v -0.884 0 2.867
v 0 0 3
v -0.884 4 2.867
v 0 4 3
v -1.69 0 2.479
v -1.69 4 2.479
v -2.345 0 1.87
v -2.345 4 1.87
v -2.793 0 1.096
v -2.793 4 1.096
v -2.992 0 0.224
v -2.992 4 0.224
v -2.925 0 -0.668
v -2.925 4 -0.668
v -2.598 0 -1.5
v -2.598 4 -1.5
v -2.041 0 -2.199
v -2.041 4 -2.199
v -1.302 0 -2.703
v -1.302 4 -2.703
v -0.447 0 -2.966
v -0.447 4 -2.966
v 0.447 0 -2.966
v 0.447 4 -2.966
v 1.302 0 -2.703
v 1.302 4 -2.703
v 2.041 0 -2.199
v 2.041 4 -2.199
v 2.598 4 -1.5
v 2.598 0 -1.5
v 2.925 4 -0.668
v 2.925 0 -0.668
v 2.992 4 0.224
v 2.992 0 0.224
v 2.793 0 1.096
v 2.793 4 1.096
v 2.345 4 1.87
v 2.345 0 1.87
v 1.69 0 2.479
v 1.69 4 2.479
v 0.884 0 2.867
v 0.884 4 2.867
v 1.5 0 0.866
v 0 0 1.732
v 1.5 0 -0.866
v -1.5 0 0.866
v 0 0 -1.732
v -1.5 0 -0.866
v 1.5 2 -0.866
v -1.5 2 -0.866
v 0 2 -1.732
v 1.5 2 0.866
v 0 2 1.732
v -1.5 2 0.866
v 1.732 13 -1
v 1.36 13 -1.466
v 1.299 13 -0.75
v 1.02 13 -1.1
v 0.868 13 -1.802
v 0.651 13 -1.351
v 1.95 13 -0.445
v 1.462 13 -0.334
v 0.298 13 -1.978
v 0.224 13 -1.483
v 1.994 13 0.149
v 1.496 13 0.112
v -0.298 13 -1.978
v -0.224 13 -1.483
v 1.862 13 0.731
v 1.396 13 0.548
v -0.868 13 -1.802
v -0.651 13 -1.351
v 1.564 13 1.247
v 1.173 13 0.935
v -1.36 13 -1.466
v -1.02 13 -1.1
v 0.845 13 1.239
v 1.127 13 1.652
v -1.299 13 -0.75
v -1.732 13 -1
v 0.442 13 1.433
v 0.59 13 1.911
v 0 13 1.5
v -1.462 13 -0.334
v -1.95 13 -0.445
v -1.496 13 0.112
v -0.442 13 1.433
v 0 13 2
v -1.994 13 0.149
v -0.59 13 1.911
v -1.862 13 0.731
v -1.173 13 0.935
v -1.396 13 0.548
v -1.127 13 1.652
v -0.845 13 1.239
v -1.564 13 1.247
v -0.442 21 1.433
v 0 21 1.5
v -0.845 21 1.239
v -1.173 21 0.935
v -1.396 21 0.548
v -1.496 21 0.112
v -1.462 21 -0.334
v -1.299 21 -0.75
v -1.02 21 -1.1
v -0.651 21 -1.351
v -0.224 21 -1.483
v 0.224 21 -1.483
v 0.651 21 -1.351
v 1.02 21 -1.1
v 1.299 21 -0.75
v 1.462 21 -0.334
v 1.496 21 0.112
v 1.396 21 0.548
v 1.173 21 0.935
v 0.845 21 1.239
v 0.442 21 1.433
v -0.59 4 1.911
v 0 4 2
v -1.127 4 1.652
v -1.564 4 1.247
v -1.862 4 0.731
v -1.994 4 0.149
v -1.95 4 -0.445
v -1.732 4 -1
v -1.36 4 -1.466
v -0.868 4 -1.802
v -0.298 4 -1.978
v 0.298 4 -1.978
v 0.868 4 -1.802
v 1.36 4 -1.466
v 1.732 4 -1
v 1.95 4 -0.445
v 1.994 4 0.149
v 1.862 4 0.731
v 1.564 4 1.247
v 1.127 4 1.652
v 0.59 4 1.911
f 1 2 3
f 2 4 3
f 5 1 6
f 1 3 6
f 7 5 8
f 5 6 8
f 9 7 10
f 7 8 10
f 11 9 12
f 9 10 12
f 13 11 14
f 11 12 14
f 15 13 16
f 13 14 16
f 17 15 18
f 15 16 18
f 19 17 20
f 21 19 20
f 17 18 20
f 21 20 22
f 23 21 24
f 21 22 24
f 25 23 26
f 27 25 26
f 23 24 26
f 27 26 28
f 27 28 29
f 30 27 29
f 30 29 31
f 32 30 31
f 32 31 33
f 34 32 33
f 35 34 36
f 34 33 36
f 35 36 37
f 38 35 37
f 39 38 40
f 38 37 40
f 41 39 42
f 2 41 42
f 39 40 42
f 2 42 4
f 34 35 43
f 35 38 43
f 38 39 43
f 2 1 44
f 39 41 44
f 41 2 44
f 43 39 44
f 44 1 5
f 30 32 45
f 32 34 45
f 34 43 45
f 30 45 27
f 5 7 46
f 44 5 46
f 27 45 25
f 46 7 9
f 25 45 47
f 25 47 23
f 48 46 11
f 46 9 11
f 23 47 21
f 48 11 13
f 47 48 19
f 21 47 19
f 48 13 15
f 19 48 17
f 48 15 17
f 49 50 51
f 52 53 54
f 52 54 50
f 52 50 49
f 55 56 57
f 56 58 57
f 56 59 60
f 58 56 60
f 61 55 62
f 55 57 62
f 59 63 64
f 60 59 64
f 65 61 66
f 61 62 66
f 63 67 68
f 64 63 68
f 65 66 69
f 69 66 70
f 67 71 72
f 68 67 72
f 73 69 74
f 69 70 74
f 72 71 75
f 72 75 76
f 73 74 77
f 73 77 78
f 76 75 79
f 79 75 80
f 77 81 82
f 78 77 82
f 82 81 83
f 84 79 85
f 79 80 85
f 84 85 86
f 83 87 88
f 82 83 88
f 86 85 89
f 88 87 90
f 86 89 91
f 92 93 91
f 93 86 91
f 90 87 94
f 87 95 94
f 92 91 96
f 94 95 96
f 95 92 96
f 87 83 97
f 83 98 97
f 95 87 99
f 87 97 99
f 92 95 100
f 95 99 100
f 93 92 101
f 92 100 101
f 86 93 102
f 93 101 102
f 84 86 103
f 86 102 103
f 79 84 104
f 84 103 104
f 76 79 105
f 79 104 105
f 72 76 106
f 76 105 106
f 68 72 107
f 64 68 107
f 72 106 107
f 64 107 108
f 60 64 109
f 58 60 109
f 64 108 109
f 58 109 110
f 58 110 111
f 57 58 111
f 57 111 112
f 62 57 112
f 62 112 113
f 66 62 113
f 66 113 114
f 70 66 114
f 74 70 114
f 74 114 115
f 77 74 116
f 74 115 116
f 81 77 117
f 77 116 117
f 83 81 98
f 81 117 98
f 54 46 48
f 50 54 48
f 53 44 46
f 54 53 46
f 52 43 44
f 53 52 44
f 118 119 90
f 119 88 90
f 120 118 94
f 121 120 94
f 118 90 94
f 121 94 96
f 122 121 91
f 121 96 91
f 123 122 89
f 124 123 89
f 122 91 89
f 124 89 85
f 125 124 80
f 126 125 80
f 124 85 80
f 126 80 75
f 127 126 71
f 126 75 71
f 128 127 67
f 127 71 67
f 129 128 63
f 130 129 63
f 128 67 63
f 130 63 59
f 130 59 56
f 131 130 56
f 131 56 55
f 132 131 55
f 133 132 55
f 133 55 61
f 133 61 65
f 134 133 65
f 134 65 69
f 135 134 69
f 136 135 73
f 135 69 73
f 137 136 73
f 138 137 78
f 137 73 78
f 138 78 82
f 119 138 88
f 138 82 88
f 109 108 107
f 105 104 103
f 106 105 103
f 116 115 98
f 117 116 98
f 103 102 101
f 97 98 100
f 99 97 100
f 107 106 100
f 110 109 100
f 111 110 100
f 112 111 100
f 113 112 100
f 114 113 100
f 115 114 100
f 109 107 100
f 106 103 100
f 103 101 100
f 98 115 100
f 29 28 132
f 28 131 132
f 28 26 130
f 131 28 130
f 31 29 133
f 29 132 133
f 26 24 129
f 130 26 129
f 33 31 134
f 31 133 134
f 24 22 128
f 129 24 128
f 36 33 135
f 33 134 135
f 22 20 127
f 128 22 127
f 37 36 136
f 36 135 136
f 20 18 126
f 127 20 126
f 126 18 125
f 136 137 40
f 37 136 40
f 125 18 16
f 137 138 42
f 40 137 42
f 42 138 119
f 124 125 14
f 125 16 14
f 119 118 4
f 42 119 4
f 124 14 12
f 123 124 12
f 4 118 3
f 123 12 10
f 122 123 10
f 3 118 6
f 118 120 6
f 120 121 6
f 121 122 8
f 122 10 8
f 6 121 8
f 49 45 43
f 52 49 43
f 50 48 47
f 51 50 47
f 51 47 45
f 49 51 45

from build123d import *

# Parameters (mm, degrees)
CUT_EXTRUDE1_DEPTH = 2


with BuildPart() as part:
    # Sketch1 → Revolve1 (revolve)
    with BuildSketch(Plane.XY, mode=Mode.PRIVATE) as revolve1_sk:
        Polygon((0, 0), (3, 0), (3, 4), (2, 4), (2, 13), (1.5, 13), (1.5, 21), (0, 21), align=None)
    revolve(revolve1_sk.sketch.rotate(Axis((0, 21, 0), (0, -1, 0)), 90), axis=Axis((0, 21, 0), (0, -1, 0)))

    # Sketch2 → Cut-Extrude1 (cut)
    with BuildSketch(Plane.XZ):
        Polygon((0, -1.732050808), (1.5, -0.866025404), (1.5, 0.866025404), (0, 1.732050808), (-1.5, 0.866025404), (-1.5, -0.866025404), align=None)
    extrude(amount=-CUT_EXTRUDE1_DEPTH, mode=Mode.SUBTRACT)


solid = part.part
